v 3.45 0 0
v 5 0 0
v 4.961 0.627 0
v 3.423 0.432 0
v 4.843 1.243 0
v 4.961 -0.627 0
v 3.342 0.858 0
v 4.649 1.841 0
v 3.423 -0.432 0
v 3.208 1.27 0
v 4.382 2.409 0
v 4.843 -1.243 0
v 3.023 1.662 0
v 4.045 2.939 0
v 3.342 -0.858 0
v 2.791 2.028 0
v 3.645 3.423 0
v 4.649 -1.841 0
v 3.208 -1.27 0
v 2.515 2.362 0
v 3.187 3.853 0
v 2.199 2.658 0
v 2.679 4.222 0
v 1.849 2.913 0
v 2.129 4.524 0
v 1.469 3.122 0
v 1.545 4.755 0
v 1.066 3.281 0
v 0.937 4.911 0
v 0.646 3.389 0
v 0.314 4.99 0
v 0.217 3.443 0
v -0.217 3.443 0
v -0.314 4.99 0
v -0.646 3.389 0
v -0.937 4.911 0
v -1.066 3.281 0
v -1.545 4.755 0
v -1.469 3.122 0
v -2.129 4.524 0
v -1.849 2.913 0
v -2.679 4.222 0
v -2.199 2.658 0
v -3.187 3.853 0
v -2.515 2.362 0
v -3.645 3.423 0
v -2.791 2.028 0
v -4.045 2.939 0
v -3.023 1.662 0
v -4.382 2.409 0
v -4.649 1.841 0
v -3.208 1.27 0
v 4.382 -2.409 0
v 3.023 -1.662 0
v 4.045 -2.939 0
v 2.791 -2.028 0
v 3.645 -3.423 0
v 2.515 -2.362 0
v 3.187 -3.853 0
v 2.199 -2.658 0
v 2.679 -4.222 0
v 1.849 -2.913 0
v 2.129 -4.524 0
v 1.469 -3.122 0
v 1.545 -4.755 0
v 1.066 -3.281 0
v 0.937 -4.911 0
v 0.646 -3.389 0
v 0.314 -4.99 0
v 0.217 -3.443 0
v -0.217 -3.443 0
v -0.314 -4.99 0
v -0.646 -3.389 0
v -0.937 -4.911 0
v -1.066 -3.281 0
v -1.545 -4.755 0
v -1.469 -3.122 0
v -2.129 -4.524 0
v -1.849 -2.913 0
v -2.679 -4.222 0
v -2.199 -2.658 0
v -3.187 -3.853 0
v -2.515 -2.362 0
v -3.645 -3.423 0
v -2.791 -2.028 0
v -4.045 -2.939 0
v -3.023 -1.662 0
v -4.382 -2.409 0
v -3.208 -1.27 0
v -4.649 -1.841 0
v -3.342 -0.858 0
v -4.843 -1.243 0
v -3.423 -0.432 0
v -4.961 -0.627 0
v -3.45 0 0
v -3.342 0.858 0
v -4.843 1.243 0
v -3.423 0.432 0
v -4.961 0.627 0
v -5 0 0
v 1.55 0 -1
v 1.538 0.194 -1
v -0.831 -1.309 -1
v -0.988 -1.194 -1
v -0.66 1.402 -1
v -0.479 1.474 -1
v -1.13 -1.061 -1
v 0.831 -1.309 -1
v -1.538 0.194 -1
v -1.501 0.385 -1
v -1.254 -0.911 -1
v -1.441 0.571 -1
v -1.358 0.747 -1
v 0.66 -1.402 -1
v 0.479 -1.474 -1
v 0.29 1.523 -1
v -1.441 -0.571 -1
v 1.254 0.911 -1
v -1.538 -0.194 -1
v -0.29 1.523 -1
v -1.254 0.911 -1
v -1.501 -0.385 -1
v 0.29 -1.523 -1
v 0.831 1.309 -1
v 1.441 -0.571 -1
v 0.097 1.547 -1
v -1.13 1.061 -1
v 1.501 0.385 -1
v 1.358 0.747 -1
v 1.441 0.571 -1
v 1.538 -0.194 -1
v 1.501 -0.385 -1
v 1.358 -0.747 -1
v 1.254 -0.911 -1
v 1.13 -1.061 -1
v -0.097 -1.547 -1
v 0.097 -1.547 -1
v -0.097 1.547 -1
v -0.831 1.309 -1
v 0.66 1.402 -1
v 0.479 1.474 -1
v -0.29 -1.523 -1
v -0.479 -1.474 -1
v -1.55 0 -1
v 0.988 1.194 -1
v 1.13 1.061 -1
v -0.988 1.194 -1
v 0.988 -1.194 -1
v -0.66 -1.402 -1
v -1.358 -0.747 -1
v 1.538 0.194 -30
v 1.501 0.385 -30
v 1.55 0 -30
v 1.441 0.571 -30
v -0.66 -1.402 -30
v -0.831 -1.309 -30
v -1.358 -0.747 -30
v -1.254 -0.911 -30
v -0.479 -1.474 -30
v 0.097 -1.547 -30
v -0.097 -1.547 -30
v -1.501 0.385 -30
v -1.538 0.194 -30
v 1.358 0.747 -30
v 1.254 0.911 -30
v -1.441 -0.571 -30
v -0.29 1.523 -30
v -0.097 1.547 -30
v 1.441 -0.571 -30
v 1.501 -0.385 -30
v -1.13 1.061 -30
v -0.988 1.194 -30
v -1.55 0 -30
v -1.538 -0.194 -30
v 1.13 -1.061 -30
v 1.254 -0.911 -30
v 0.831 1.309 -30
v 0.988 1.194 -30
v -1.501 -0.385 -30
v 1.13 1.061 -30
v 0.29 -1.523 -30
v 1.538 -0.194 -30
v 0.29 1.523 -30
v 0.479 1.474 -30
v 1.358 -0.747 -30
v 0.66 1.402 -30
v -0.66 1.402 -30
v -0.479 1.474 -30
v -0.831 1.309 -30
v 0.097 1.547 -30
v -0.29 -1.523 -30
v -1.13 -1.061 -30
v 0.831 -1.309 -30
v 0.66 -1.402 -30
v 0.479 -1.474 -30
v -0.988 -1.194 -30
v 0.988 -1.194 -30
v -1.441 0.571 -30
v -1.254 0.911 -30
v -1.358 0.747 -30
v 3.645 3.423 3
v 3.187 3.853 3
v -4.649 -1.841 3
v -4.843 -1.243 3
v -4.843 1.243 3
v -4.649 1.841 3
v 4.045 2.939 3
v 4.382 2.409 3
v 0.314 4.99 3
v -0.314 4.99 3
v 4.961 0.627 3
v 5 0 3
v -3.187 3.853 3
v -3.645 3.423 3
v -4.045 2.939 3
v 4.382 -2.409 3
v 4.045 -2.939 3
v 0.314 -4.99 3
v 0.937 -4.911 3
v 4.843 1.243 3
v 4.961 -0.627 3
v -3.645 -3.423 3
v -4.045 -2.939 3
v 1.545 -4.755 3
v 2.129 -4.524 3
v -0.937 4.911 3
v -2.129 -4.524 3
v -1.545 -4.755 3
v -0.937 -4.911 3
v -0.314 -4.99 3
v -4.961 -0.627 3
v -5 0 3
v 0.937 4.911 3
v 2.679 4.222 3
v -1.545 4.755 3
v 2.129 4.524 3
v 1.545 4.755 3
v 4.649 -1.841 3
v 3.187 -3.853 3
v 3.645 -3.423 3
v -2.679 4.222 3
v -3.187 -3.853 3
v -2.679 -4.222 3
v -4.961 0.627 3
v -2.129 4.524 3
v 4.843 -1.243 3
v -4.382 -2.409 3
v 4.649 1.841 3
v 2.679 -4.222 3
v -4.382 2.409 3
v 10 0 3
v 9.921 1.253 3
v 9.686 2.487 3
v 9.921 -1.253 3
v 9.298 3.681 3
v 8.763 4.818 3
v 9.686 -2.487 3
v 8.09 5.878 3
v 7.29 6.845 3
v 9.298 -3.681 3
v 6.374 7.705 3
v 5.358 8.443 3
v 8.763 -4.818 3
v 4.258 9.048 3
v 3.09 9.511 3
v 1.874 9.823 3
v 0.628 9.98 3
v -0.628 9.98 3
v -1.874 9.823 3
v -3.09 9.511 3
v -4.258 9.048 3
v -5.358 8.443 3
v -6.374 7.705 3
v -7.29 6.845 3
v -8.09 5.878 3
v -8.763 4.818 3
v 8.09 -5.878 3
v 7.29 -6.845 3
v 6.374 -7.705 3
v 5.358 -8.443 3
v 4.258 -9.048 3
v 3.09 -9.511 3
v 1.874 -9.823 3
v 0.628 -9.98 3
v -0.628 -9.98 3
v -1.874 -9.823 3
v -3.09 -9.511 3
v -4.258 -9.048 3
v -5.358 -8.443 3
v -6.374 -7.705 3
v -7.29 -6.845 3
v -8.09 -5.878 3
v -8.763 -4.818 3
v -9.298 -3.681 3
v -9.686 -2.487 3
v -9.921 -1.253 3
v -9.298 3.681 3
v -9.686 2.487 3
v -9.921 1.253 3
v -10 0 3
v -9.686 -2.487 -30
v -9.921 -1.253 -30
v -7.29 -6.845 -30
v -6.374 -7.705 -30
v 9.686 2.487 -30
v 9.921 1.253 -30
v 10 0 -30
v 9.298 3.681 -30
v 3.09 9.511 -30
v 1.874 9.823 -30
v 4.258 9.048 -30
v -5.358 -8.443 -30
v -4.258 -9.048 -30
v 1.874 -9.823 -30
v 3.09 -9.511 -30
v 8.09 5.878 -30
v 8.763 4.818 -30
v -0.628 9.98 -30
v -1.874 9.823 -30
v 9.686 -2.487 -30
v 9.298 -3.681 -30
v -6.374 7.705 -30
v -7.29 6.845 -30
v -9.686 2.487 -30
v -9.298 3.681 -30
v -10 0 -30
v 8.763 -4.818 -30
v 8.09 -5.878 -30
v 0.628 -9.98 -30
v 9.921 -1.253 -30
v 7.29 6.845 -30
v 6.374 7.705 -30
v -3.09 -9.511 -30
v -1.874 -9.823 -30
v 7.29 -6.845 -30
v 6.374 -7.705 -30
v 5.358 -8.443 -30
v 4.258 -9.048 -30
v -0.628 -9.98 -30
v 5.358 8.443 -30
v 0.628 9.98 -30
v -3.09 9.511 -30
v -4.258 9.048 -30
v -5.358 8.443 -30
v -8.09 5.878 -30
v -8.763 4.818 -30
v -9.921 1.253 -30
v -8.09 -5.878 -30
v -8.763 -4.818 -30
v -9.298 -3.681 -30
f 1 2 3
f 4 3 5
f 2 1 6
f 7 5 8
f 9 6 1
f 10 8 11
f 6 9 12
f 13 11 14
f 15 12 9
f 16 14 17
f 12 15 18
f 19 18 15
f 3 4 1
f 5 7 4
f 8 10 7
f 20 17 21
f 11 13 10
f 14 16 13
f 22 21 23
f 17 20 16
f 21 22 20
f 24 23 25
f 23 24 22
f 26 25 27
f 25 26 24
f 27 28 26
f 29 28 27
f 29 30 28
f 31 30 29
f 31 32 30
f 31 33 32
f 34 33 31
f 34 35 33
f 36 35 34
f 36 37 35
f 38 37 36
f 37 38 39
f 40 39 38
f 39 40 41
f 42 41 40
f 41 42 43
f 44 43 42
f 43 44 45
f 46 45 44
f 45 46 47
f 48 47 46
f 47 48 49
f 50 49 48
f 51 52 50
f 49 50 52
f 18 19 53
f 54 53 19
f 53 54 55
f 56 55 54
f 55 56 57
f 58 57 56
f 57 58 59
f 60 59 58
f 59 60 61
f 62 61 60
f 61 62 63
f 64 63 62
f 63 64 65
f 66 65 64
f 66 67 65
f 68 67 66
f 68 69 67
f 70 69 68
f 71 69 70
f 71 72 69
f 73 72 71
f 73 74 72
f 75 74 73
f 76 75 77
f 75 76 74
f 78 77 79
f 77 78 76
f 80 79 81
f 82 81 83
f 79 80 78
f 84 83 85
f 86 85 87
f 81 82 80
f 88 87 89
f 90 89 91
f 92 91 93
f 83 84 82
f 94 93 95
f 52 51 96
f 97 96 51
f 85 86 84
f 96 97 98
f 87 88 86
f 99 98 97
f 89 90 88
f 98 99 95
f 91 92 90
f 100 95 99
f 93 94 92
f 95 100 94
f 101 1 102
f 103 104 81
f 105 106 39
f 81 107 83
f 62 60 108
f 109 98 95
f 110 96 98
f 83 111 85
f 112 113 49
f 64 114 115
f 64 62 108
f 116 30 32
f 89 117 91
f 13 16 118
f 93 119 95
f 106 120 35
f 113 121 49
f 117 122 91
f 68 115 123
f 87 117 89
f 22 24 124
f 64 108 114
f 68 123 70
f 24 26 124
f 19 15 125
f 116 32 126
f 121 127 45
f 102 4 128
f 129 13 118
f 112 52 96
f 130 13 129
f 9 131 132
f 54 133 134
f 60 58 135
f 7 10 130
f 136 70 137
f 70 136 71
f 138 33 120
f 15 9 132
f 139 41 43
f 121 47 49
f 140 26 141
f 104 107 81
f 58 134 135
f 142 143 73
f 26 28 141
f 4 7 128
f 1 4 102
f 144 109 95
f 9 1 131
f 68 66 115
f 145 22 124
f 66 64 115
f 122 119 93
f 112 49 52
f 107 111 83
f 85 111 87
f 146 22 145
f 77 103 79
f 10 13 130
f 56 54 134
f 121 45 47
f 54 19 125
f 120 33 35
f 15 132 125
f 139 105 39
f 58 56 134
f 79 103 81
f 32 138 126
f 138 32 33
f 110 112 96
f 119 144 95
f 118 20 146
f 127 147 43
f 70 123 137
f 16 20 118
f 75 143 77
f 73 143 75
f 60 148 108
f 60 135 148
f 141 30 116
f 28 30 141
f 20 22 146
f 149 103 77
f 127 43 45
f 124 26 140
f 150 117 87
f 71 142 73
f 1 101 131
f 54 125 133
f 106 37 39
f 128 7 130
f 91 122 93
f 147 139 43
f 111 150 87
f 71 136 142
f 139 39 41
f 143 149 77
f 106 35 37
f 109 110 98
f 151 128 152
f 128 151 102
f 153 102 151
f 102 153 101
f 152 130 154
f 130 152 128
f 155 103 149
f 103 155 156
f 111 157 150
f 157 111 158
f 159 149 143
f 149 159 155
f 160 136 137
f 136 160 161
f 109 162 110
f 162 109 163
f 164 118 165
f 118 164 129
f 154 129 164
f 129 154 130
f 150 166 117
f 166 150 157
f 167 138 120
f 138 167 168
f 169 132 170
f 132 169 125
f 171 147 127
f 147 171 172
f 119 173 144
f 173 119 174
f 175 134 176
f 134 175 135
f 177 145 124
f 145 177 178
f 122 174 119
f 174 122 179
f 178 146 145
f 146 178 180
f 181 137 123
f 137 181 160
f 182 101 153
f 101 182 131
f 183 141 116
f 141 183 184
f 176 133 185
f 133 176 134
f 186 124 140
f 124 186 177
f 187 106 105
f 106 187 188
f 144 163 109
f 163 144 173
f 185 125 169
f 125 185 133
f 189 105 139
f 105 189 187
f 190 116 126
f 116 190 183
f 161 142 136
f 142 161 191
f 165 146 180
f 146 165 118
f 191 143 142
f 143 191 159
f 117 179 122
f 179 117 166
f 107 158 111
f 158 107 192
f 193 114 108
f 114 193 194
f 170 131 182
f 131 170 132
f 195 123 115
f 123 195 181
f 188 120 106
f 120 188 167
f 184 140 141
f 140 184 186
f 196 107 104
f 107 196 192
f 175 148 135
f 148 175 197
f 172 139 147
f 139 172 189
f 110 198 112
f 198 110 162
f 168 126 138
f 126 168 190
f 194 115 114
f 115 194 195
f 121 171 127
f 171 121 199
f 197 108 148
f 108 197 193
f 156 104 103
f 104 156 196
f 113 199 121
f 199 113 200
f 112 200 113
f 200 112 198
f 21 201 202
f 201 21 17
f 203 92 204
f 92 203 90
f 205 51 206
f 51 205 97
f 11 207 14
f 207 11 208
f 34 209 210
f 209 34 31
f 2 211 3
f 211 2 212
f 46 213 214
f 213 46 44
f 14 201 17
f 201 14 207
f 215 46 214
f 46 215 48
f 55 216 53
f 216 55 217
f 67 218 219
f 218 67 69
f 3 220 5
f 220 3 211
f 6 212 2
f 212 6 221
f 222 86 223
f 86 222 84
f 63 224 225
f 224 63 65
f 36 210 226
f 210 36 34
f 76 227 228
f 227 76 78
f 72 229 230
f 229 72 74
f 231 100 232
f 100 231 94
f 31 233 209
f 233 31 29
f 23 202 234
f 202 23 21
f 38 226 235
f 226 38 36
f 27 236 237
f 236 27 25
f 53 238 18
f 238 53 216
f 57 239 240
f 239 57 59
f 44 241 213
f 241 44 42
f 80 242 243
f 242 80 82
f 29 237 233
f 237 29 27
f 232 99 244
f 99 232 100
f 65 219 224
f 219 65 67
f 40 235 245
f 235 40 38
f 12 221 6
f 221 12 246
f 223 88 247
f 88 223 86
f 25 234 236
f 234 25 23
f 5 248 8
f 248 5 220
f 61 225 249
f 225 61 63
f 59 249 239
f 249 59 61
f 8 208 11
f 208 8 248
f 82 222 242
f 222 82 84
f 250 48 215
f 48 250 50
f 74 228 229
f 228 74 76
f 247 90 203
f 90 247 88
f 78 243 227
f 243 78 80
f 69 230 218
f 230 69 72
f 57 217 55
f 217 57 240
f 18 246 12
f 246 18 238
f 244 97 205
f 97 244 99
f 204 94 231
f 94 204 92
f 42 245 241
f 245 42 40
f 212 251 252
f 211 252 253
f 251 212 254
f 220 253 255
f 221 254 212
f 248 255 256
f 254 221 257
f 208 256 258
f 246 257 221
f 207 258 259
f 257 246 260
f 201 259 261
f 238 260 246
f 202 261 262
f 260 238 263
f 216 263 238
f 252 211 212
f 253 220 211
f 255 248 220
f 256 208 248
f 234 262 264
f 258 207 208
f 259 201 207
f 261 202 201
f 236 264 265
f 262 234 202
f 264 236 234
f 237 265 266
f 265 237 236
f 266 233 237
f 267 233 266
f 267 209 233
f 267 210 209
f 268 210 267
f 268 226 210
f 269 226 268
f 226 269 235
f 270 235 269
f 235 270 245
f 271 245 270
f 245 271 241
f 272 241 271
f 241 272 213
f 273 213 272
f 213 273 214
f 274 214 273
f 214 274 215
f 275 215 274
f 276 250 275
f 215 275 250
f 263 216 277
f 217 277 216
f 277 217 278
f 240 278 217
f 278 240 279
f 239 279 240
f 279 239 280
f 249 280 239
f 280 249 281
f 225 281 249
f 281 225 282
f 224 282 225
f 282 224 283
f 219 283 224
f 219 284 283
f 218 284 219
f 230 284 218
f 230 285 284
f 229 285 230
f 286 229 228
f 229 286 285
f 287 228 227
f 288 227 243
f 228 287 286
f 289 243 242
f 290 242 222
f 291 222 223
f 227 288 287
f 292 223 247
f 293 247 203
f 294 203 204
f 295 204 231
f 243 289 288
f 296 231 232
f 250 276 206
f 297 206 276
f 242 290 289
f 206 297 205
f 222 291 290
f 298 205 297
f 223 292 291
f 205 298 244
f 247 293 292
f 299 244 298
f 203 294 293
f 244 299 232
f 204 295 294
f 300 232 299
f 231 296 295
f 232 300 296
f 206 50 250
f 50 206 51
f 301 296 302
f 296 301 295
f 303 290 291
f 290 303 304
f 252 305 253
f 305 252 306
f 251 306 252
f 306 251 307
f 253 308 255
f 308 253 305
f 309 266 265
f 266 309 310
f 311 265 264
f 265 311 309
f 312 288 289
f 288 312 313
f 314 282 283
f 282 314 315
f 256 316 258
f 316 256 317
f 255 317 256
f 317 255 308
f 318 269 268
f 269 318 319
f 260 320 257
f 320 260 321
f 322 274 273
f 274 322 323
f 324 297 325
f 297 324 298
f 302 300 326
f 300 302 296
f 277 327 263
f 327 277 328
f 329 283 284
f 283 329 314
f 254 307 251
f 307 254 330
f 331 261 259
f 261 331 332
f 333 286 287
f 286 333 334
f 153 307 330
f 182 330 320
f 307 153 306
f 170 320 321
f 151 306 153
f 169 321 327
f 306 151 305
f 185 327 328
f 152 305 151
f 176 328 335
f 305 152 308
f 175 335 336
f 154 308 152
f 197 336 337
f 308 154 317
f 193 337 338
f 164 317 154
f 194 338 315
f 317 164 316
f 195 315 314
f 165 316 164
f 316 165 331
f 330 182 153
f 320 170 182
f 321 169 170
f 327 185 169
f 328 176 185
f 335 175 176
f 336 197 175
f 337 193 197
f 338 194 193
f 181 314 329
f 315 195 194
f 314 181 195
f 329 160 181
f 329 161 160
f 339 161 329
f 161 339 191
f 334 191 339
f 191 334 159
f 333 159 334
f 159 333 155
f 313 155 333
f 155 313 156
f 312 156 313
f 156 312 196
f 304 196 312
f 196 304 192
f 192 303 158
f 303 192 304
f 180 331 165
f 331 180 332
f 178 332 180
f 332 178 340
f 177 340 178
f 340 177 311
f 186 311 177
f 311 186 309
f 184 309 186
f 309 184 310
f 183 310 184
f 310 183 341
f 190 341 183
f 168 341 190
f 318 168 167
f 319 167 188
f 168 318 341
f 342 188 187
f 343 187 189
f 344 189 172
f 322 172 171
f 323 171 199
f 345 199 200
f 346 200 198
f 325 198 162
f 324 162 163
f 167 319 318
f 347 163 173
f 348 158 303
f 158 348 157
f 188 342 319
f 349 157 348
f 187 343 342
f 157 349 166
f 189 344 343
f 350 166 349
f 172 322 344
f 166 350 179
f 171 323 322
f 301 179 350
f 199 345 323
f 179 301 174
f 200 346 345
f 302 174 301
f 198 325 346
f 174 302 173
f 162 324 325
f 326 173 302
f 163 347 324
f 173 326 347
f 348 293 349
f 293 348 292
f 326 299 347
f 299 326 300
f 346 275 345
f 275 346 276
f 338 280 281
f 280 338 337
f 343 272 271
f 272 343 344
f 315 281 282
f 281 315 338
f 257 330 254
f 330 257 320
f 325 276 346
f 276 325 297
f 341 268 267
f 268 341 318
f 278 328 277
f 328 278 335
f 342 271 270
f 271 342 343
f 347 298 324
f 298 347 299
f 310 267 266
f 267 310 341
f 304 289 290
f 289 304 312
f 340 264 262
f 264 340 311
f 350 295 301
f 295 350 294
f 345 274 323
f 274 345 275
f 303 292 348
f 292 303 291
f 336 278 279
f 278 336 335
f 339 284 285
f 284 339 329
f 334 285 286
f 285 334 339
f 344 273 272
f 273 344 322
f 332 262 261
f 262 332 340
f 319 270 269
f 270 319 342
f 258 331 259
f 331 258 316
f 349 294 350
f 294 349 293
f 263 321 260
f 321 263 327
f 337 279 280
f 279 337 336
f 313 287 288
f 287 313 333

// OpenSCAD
$fn = 50;

difference() {
	union() {
		translate(v = [0, 0, -30.0]) {
			cylinder(h = 33, r = 10.0);
		}
	}
	union() {
		translate(v = [0, 0, 0]) {
			rotate(a = [0, 0, 0]) {
				difference() {
					union() {
						translate(v = [0, 0, -33.0]) {
							cylinder(h = 33, r = 1.25);
						}
						translate(v = [0, 0, -1.0]) {
							cylinder(h = 1.0, r1 = 1.55, r2 = 3.45);
						}
						translate(v = [0, 0, -33.0]) {
							cylinder(h = 33, r = 1.55);
						}
						translate(v = [0, 0, -33.0]) {
							cylinder(h = 33, r = 1.25);
						}
					}
					union();
				}
			}
		}
		#cylinder(h = 3, r = 5.0);
	}
}
